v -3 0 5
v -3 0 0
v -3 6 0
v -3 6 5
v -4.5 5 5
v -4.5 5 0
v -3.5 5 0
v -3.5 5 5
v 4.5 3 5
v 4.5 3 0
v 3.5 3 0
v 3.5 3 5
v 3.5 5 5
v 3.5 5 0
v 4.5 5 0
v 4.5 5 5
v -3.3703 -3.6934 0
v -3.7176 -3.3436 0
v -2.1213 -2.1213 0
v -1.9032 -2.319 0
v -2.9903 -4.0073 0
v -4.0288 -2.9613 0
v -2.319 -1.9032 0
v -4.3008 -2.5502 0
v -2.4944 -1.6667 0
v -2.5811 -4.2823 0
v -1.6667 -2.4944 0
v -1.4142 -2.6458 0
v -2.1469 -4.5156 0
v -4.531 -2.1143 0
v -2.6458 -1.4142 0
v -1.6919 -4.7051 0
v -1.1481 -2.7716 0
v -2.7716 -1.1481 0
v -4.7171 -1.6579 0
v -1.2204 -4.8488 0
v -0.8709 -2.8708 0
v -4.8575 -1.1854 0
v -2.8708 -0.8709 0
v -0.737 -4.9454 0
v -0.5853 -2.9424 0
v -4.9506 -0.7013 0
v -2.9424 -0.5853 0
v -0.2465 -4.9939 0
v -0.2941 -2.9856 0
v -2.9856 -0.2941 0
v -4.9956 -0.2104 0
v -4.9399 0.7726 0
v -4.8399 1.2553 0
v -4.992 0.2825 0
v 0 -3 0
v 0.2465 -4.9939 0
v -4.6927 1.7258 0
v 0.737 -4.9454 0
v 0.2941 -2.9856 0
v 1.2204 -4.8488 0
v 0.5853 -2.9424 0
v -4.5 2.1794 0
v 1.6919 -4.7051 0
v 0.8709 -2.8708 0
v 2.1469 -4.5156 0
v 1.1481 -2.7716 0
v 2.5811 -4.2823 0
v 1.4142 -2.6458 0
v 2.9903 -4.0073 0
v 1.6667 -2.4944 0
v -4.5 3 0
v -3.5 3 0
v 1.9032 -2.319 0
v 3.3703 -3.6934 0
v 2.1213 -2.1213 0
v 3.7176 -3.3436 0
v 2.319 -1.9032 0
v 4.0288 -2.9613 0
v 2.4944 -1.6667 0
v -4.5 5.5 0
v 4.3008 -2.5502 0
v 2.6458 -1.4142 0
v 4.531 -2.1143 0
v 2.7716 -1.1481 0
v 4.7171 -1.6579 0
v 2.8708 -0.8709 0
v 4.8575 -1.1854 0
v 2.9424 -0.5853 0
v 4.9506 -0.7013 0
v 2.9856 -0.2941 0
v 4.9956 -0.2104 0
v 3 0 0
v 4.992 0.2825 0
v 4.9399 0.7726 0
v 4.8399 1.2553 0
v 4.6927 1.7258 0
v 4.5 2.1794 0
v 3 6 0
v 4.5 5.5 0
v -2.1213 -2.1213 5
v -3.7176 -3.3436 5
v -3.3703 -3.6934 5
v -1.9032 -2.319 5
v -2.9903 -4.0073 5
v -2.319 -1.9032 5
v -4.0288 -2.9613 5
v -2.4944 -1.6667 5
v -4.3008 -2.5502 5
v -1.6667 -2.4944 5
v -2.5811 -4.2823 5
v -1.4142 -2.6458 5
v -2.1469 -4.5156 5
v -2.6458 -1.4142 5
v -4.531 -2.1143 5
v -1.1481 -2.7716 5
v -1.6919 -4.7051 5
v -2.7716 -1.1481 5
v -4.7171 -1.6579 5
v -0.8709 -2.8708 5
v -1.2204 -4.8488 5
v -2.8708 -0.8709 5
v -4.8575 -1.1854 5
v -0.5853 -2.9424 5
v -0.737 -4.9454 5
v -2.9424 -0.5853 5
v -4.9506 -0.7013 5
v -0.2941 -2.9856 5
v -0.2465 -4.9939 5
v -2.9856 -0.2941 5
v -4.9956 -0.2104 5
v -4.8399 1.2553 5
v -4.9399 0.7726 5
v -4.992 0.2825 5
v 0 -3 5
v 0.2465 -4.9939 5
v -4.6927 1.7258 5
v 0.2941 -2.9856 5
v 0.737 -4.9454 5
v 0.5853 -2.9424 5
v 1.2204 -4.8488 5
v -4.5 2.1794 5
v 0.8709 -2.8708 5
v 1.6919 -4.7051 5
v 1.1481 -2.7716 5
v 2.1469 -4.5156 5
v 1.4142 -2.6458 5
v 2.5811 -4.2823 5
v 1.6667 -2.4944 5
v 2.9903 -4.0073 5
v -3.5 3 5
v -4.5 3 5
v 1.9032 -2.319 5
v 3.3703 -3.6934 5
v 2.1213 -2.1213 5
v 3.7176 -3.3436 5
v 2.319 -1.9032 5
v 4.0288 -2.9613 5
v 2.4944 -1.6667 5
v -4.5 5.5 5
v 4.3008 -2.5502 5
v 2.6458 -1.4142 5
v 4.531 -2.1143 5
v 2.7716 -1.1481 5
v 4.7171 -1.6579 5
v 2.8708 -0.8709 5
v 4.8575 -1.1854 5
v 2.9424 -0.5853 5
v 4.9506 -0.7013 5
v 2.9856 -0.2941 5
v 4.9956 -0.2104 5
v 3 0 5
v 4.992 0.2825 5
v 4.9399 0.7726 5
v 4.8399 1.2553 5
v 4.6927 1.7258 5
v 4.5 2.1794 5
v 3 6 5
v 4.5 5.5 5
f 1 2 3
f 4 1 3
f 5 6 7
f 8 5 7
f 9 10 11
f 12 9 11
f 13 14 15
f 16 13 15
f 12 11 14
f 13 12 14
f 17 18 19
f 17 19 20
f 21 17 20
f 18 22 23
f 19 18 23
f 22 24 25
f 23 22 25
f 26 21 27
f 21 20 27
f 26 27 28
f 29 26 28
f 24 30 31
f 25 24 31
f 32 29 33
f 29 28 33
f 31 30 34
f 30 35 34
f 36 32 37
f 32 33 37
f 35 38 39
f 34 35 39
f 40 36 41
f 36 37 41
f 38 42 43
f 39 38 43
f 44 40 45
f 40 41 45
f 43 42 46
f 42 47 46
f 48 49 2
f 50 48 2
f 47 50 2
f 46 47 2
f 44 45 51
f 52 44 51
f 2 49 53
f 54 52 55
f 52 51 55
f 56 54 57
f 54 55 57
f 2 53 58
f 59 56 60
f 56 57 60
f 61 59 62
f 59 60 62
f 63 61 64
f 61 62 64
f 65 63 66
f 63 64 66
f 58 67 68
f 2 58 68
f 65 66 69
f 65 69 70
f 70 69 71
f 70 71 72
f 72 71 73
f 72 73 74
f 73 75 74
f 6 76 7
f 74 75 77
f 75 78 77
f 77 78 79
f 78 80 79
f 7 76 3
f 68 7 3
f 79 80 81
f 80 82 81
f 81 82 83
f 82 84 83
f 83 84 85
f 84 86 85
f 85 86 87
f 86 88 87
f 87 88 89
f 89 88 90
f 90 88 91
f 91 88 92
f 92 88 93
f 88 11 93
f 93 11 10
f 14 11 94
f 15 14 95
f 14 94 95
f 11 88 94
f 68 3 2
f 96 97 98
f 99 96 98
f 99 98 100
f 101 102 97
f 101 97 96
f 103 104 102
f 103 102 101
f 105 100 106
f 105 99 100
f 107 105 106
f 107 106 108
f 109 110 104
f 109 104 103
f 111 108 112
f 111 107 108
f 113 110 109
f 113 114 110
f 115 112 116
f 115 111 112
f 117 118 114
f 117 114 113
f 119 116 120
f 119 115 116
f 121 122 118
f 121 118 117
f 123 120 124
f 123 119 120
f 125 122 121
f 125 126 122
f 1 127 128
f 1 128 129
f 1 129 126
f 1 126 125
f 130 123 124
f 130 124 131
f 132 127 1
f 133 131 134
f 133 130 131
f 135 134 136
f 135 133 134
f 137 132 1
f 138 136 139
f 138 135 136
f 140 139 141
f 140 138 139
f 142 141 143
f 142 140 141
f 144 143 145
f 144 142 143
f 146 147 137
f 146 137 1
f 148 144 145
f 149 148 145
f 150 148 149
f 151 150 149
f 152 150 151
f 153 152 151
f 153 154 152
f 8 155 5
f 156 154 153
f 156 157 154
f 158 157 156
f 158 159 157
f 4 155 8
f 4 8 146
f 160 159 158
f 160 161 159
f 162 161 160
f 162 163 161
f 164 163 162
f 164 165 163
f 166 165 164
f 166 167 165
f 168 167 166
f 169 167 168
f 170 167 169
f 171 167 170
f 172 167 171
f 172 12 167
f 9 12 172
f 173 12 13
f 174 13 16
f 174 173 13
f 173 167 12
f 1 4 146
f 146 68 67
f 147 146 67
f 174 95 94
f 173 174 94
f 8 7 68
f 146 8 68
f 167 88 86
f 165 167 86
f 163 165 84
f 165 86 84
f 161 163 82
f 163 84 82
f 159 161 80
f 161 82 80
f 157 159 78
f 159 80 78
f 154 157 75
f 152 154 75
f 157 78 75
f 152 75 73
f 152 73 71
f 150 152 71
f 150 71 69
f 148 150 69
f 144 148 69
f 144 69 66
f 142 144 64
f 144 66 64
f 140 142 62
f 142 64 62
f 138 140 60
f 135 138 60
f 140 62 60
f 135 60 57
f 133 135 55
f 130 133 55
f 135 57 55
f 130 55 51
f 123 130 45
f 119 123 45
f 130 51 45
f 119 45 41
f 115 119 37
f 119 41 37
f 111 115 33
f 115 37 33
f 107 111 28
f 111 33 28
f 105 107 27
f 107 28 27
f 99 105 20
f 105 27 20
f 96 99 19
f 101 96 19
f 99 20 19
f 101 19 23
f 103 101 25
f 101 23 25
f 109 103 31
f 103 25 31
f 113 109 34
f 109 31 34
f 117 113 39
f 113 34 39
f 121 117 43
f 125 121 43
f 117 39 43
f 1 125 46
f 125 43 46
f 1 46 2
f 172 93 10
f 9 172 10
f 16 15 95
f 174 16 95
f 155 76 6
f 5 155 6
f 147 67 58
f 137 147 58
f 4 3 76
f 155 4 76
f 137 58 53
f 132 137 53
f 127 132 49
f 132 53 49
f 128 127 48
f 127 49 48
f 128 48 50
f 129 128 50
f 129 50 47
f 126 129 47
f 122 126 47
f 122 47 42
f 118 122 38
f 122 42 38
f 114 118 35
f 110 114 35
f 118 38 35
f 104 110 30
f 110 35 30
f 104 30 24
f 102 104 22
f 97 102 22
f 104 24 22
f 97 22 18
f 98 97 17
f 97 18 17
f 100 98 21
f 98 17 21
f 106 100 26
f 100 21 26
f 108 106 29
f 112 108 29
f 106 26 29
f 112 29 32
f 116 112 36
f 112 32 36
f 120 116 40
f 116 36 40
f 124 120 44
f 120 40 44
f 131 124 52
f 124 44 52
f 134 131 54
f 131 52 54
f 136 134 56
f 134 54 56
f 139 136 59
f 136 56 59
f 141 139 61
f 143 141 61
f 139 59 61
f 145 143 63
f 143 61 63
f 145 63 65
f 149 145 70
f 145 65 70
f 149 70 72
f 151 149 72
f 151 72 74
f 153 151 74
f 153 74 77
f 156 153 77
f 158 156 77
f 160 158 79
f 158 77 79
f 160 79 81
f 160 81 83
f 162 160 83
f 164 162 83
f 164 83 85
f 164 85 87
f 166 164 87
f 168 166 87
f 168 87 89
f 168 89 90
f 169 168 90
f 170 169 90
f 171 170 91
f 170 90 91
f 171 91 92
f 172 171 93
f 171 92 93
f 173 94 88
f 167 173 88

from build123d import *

# Parameters (mm, degrees)
F1_DEPTH = 5


with BuildPart() as f1:
    # F0 (on Top) → F1 (new body)
    with BuildSketch(Plane.XY):
        with BuildLine():
            Line((-4.5, 3), (-4.5, 2.179449))
            ThreePointArc((-4.5, 2.179449), (0, -5), (4.5, 2.179449))
            Line((4.5, 2.179449), (4.5, 3))
            Line((4.5, 3), (3.5, 3))
            Line((3.5, 3), (3.5, 5))
            Line((3.5, 5), (4.5, 5))
            Line((4.5, 5), (4.5, 5.5))
            Line((4.5, 5.5), (3, 6))
            Line((3, 6), (3, 0))
            ThreePointArc((3, 0), (0, -3), (-3, 0))
            Line((-3, 0), (-3, 6))
            Line((-3, 6), (-4.5, 5.5))
            Line((-4.5, 5.5), (-4.5, 5))
            Line((-4.5, 5), (-3.5, 5))
            Line((-3.5, 5), (-3.5, 3))
            Line((-3.5, 3), (-4.5, 3))
        make_face()
    extrude(amount=F1_DEPTH)


solid = f1.part
